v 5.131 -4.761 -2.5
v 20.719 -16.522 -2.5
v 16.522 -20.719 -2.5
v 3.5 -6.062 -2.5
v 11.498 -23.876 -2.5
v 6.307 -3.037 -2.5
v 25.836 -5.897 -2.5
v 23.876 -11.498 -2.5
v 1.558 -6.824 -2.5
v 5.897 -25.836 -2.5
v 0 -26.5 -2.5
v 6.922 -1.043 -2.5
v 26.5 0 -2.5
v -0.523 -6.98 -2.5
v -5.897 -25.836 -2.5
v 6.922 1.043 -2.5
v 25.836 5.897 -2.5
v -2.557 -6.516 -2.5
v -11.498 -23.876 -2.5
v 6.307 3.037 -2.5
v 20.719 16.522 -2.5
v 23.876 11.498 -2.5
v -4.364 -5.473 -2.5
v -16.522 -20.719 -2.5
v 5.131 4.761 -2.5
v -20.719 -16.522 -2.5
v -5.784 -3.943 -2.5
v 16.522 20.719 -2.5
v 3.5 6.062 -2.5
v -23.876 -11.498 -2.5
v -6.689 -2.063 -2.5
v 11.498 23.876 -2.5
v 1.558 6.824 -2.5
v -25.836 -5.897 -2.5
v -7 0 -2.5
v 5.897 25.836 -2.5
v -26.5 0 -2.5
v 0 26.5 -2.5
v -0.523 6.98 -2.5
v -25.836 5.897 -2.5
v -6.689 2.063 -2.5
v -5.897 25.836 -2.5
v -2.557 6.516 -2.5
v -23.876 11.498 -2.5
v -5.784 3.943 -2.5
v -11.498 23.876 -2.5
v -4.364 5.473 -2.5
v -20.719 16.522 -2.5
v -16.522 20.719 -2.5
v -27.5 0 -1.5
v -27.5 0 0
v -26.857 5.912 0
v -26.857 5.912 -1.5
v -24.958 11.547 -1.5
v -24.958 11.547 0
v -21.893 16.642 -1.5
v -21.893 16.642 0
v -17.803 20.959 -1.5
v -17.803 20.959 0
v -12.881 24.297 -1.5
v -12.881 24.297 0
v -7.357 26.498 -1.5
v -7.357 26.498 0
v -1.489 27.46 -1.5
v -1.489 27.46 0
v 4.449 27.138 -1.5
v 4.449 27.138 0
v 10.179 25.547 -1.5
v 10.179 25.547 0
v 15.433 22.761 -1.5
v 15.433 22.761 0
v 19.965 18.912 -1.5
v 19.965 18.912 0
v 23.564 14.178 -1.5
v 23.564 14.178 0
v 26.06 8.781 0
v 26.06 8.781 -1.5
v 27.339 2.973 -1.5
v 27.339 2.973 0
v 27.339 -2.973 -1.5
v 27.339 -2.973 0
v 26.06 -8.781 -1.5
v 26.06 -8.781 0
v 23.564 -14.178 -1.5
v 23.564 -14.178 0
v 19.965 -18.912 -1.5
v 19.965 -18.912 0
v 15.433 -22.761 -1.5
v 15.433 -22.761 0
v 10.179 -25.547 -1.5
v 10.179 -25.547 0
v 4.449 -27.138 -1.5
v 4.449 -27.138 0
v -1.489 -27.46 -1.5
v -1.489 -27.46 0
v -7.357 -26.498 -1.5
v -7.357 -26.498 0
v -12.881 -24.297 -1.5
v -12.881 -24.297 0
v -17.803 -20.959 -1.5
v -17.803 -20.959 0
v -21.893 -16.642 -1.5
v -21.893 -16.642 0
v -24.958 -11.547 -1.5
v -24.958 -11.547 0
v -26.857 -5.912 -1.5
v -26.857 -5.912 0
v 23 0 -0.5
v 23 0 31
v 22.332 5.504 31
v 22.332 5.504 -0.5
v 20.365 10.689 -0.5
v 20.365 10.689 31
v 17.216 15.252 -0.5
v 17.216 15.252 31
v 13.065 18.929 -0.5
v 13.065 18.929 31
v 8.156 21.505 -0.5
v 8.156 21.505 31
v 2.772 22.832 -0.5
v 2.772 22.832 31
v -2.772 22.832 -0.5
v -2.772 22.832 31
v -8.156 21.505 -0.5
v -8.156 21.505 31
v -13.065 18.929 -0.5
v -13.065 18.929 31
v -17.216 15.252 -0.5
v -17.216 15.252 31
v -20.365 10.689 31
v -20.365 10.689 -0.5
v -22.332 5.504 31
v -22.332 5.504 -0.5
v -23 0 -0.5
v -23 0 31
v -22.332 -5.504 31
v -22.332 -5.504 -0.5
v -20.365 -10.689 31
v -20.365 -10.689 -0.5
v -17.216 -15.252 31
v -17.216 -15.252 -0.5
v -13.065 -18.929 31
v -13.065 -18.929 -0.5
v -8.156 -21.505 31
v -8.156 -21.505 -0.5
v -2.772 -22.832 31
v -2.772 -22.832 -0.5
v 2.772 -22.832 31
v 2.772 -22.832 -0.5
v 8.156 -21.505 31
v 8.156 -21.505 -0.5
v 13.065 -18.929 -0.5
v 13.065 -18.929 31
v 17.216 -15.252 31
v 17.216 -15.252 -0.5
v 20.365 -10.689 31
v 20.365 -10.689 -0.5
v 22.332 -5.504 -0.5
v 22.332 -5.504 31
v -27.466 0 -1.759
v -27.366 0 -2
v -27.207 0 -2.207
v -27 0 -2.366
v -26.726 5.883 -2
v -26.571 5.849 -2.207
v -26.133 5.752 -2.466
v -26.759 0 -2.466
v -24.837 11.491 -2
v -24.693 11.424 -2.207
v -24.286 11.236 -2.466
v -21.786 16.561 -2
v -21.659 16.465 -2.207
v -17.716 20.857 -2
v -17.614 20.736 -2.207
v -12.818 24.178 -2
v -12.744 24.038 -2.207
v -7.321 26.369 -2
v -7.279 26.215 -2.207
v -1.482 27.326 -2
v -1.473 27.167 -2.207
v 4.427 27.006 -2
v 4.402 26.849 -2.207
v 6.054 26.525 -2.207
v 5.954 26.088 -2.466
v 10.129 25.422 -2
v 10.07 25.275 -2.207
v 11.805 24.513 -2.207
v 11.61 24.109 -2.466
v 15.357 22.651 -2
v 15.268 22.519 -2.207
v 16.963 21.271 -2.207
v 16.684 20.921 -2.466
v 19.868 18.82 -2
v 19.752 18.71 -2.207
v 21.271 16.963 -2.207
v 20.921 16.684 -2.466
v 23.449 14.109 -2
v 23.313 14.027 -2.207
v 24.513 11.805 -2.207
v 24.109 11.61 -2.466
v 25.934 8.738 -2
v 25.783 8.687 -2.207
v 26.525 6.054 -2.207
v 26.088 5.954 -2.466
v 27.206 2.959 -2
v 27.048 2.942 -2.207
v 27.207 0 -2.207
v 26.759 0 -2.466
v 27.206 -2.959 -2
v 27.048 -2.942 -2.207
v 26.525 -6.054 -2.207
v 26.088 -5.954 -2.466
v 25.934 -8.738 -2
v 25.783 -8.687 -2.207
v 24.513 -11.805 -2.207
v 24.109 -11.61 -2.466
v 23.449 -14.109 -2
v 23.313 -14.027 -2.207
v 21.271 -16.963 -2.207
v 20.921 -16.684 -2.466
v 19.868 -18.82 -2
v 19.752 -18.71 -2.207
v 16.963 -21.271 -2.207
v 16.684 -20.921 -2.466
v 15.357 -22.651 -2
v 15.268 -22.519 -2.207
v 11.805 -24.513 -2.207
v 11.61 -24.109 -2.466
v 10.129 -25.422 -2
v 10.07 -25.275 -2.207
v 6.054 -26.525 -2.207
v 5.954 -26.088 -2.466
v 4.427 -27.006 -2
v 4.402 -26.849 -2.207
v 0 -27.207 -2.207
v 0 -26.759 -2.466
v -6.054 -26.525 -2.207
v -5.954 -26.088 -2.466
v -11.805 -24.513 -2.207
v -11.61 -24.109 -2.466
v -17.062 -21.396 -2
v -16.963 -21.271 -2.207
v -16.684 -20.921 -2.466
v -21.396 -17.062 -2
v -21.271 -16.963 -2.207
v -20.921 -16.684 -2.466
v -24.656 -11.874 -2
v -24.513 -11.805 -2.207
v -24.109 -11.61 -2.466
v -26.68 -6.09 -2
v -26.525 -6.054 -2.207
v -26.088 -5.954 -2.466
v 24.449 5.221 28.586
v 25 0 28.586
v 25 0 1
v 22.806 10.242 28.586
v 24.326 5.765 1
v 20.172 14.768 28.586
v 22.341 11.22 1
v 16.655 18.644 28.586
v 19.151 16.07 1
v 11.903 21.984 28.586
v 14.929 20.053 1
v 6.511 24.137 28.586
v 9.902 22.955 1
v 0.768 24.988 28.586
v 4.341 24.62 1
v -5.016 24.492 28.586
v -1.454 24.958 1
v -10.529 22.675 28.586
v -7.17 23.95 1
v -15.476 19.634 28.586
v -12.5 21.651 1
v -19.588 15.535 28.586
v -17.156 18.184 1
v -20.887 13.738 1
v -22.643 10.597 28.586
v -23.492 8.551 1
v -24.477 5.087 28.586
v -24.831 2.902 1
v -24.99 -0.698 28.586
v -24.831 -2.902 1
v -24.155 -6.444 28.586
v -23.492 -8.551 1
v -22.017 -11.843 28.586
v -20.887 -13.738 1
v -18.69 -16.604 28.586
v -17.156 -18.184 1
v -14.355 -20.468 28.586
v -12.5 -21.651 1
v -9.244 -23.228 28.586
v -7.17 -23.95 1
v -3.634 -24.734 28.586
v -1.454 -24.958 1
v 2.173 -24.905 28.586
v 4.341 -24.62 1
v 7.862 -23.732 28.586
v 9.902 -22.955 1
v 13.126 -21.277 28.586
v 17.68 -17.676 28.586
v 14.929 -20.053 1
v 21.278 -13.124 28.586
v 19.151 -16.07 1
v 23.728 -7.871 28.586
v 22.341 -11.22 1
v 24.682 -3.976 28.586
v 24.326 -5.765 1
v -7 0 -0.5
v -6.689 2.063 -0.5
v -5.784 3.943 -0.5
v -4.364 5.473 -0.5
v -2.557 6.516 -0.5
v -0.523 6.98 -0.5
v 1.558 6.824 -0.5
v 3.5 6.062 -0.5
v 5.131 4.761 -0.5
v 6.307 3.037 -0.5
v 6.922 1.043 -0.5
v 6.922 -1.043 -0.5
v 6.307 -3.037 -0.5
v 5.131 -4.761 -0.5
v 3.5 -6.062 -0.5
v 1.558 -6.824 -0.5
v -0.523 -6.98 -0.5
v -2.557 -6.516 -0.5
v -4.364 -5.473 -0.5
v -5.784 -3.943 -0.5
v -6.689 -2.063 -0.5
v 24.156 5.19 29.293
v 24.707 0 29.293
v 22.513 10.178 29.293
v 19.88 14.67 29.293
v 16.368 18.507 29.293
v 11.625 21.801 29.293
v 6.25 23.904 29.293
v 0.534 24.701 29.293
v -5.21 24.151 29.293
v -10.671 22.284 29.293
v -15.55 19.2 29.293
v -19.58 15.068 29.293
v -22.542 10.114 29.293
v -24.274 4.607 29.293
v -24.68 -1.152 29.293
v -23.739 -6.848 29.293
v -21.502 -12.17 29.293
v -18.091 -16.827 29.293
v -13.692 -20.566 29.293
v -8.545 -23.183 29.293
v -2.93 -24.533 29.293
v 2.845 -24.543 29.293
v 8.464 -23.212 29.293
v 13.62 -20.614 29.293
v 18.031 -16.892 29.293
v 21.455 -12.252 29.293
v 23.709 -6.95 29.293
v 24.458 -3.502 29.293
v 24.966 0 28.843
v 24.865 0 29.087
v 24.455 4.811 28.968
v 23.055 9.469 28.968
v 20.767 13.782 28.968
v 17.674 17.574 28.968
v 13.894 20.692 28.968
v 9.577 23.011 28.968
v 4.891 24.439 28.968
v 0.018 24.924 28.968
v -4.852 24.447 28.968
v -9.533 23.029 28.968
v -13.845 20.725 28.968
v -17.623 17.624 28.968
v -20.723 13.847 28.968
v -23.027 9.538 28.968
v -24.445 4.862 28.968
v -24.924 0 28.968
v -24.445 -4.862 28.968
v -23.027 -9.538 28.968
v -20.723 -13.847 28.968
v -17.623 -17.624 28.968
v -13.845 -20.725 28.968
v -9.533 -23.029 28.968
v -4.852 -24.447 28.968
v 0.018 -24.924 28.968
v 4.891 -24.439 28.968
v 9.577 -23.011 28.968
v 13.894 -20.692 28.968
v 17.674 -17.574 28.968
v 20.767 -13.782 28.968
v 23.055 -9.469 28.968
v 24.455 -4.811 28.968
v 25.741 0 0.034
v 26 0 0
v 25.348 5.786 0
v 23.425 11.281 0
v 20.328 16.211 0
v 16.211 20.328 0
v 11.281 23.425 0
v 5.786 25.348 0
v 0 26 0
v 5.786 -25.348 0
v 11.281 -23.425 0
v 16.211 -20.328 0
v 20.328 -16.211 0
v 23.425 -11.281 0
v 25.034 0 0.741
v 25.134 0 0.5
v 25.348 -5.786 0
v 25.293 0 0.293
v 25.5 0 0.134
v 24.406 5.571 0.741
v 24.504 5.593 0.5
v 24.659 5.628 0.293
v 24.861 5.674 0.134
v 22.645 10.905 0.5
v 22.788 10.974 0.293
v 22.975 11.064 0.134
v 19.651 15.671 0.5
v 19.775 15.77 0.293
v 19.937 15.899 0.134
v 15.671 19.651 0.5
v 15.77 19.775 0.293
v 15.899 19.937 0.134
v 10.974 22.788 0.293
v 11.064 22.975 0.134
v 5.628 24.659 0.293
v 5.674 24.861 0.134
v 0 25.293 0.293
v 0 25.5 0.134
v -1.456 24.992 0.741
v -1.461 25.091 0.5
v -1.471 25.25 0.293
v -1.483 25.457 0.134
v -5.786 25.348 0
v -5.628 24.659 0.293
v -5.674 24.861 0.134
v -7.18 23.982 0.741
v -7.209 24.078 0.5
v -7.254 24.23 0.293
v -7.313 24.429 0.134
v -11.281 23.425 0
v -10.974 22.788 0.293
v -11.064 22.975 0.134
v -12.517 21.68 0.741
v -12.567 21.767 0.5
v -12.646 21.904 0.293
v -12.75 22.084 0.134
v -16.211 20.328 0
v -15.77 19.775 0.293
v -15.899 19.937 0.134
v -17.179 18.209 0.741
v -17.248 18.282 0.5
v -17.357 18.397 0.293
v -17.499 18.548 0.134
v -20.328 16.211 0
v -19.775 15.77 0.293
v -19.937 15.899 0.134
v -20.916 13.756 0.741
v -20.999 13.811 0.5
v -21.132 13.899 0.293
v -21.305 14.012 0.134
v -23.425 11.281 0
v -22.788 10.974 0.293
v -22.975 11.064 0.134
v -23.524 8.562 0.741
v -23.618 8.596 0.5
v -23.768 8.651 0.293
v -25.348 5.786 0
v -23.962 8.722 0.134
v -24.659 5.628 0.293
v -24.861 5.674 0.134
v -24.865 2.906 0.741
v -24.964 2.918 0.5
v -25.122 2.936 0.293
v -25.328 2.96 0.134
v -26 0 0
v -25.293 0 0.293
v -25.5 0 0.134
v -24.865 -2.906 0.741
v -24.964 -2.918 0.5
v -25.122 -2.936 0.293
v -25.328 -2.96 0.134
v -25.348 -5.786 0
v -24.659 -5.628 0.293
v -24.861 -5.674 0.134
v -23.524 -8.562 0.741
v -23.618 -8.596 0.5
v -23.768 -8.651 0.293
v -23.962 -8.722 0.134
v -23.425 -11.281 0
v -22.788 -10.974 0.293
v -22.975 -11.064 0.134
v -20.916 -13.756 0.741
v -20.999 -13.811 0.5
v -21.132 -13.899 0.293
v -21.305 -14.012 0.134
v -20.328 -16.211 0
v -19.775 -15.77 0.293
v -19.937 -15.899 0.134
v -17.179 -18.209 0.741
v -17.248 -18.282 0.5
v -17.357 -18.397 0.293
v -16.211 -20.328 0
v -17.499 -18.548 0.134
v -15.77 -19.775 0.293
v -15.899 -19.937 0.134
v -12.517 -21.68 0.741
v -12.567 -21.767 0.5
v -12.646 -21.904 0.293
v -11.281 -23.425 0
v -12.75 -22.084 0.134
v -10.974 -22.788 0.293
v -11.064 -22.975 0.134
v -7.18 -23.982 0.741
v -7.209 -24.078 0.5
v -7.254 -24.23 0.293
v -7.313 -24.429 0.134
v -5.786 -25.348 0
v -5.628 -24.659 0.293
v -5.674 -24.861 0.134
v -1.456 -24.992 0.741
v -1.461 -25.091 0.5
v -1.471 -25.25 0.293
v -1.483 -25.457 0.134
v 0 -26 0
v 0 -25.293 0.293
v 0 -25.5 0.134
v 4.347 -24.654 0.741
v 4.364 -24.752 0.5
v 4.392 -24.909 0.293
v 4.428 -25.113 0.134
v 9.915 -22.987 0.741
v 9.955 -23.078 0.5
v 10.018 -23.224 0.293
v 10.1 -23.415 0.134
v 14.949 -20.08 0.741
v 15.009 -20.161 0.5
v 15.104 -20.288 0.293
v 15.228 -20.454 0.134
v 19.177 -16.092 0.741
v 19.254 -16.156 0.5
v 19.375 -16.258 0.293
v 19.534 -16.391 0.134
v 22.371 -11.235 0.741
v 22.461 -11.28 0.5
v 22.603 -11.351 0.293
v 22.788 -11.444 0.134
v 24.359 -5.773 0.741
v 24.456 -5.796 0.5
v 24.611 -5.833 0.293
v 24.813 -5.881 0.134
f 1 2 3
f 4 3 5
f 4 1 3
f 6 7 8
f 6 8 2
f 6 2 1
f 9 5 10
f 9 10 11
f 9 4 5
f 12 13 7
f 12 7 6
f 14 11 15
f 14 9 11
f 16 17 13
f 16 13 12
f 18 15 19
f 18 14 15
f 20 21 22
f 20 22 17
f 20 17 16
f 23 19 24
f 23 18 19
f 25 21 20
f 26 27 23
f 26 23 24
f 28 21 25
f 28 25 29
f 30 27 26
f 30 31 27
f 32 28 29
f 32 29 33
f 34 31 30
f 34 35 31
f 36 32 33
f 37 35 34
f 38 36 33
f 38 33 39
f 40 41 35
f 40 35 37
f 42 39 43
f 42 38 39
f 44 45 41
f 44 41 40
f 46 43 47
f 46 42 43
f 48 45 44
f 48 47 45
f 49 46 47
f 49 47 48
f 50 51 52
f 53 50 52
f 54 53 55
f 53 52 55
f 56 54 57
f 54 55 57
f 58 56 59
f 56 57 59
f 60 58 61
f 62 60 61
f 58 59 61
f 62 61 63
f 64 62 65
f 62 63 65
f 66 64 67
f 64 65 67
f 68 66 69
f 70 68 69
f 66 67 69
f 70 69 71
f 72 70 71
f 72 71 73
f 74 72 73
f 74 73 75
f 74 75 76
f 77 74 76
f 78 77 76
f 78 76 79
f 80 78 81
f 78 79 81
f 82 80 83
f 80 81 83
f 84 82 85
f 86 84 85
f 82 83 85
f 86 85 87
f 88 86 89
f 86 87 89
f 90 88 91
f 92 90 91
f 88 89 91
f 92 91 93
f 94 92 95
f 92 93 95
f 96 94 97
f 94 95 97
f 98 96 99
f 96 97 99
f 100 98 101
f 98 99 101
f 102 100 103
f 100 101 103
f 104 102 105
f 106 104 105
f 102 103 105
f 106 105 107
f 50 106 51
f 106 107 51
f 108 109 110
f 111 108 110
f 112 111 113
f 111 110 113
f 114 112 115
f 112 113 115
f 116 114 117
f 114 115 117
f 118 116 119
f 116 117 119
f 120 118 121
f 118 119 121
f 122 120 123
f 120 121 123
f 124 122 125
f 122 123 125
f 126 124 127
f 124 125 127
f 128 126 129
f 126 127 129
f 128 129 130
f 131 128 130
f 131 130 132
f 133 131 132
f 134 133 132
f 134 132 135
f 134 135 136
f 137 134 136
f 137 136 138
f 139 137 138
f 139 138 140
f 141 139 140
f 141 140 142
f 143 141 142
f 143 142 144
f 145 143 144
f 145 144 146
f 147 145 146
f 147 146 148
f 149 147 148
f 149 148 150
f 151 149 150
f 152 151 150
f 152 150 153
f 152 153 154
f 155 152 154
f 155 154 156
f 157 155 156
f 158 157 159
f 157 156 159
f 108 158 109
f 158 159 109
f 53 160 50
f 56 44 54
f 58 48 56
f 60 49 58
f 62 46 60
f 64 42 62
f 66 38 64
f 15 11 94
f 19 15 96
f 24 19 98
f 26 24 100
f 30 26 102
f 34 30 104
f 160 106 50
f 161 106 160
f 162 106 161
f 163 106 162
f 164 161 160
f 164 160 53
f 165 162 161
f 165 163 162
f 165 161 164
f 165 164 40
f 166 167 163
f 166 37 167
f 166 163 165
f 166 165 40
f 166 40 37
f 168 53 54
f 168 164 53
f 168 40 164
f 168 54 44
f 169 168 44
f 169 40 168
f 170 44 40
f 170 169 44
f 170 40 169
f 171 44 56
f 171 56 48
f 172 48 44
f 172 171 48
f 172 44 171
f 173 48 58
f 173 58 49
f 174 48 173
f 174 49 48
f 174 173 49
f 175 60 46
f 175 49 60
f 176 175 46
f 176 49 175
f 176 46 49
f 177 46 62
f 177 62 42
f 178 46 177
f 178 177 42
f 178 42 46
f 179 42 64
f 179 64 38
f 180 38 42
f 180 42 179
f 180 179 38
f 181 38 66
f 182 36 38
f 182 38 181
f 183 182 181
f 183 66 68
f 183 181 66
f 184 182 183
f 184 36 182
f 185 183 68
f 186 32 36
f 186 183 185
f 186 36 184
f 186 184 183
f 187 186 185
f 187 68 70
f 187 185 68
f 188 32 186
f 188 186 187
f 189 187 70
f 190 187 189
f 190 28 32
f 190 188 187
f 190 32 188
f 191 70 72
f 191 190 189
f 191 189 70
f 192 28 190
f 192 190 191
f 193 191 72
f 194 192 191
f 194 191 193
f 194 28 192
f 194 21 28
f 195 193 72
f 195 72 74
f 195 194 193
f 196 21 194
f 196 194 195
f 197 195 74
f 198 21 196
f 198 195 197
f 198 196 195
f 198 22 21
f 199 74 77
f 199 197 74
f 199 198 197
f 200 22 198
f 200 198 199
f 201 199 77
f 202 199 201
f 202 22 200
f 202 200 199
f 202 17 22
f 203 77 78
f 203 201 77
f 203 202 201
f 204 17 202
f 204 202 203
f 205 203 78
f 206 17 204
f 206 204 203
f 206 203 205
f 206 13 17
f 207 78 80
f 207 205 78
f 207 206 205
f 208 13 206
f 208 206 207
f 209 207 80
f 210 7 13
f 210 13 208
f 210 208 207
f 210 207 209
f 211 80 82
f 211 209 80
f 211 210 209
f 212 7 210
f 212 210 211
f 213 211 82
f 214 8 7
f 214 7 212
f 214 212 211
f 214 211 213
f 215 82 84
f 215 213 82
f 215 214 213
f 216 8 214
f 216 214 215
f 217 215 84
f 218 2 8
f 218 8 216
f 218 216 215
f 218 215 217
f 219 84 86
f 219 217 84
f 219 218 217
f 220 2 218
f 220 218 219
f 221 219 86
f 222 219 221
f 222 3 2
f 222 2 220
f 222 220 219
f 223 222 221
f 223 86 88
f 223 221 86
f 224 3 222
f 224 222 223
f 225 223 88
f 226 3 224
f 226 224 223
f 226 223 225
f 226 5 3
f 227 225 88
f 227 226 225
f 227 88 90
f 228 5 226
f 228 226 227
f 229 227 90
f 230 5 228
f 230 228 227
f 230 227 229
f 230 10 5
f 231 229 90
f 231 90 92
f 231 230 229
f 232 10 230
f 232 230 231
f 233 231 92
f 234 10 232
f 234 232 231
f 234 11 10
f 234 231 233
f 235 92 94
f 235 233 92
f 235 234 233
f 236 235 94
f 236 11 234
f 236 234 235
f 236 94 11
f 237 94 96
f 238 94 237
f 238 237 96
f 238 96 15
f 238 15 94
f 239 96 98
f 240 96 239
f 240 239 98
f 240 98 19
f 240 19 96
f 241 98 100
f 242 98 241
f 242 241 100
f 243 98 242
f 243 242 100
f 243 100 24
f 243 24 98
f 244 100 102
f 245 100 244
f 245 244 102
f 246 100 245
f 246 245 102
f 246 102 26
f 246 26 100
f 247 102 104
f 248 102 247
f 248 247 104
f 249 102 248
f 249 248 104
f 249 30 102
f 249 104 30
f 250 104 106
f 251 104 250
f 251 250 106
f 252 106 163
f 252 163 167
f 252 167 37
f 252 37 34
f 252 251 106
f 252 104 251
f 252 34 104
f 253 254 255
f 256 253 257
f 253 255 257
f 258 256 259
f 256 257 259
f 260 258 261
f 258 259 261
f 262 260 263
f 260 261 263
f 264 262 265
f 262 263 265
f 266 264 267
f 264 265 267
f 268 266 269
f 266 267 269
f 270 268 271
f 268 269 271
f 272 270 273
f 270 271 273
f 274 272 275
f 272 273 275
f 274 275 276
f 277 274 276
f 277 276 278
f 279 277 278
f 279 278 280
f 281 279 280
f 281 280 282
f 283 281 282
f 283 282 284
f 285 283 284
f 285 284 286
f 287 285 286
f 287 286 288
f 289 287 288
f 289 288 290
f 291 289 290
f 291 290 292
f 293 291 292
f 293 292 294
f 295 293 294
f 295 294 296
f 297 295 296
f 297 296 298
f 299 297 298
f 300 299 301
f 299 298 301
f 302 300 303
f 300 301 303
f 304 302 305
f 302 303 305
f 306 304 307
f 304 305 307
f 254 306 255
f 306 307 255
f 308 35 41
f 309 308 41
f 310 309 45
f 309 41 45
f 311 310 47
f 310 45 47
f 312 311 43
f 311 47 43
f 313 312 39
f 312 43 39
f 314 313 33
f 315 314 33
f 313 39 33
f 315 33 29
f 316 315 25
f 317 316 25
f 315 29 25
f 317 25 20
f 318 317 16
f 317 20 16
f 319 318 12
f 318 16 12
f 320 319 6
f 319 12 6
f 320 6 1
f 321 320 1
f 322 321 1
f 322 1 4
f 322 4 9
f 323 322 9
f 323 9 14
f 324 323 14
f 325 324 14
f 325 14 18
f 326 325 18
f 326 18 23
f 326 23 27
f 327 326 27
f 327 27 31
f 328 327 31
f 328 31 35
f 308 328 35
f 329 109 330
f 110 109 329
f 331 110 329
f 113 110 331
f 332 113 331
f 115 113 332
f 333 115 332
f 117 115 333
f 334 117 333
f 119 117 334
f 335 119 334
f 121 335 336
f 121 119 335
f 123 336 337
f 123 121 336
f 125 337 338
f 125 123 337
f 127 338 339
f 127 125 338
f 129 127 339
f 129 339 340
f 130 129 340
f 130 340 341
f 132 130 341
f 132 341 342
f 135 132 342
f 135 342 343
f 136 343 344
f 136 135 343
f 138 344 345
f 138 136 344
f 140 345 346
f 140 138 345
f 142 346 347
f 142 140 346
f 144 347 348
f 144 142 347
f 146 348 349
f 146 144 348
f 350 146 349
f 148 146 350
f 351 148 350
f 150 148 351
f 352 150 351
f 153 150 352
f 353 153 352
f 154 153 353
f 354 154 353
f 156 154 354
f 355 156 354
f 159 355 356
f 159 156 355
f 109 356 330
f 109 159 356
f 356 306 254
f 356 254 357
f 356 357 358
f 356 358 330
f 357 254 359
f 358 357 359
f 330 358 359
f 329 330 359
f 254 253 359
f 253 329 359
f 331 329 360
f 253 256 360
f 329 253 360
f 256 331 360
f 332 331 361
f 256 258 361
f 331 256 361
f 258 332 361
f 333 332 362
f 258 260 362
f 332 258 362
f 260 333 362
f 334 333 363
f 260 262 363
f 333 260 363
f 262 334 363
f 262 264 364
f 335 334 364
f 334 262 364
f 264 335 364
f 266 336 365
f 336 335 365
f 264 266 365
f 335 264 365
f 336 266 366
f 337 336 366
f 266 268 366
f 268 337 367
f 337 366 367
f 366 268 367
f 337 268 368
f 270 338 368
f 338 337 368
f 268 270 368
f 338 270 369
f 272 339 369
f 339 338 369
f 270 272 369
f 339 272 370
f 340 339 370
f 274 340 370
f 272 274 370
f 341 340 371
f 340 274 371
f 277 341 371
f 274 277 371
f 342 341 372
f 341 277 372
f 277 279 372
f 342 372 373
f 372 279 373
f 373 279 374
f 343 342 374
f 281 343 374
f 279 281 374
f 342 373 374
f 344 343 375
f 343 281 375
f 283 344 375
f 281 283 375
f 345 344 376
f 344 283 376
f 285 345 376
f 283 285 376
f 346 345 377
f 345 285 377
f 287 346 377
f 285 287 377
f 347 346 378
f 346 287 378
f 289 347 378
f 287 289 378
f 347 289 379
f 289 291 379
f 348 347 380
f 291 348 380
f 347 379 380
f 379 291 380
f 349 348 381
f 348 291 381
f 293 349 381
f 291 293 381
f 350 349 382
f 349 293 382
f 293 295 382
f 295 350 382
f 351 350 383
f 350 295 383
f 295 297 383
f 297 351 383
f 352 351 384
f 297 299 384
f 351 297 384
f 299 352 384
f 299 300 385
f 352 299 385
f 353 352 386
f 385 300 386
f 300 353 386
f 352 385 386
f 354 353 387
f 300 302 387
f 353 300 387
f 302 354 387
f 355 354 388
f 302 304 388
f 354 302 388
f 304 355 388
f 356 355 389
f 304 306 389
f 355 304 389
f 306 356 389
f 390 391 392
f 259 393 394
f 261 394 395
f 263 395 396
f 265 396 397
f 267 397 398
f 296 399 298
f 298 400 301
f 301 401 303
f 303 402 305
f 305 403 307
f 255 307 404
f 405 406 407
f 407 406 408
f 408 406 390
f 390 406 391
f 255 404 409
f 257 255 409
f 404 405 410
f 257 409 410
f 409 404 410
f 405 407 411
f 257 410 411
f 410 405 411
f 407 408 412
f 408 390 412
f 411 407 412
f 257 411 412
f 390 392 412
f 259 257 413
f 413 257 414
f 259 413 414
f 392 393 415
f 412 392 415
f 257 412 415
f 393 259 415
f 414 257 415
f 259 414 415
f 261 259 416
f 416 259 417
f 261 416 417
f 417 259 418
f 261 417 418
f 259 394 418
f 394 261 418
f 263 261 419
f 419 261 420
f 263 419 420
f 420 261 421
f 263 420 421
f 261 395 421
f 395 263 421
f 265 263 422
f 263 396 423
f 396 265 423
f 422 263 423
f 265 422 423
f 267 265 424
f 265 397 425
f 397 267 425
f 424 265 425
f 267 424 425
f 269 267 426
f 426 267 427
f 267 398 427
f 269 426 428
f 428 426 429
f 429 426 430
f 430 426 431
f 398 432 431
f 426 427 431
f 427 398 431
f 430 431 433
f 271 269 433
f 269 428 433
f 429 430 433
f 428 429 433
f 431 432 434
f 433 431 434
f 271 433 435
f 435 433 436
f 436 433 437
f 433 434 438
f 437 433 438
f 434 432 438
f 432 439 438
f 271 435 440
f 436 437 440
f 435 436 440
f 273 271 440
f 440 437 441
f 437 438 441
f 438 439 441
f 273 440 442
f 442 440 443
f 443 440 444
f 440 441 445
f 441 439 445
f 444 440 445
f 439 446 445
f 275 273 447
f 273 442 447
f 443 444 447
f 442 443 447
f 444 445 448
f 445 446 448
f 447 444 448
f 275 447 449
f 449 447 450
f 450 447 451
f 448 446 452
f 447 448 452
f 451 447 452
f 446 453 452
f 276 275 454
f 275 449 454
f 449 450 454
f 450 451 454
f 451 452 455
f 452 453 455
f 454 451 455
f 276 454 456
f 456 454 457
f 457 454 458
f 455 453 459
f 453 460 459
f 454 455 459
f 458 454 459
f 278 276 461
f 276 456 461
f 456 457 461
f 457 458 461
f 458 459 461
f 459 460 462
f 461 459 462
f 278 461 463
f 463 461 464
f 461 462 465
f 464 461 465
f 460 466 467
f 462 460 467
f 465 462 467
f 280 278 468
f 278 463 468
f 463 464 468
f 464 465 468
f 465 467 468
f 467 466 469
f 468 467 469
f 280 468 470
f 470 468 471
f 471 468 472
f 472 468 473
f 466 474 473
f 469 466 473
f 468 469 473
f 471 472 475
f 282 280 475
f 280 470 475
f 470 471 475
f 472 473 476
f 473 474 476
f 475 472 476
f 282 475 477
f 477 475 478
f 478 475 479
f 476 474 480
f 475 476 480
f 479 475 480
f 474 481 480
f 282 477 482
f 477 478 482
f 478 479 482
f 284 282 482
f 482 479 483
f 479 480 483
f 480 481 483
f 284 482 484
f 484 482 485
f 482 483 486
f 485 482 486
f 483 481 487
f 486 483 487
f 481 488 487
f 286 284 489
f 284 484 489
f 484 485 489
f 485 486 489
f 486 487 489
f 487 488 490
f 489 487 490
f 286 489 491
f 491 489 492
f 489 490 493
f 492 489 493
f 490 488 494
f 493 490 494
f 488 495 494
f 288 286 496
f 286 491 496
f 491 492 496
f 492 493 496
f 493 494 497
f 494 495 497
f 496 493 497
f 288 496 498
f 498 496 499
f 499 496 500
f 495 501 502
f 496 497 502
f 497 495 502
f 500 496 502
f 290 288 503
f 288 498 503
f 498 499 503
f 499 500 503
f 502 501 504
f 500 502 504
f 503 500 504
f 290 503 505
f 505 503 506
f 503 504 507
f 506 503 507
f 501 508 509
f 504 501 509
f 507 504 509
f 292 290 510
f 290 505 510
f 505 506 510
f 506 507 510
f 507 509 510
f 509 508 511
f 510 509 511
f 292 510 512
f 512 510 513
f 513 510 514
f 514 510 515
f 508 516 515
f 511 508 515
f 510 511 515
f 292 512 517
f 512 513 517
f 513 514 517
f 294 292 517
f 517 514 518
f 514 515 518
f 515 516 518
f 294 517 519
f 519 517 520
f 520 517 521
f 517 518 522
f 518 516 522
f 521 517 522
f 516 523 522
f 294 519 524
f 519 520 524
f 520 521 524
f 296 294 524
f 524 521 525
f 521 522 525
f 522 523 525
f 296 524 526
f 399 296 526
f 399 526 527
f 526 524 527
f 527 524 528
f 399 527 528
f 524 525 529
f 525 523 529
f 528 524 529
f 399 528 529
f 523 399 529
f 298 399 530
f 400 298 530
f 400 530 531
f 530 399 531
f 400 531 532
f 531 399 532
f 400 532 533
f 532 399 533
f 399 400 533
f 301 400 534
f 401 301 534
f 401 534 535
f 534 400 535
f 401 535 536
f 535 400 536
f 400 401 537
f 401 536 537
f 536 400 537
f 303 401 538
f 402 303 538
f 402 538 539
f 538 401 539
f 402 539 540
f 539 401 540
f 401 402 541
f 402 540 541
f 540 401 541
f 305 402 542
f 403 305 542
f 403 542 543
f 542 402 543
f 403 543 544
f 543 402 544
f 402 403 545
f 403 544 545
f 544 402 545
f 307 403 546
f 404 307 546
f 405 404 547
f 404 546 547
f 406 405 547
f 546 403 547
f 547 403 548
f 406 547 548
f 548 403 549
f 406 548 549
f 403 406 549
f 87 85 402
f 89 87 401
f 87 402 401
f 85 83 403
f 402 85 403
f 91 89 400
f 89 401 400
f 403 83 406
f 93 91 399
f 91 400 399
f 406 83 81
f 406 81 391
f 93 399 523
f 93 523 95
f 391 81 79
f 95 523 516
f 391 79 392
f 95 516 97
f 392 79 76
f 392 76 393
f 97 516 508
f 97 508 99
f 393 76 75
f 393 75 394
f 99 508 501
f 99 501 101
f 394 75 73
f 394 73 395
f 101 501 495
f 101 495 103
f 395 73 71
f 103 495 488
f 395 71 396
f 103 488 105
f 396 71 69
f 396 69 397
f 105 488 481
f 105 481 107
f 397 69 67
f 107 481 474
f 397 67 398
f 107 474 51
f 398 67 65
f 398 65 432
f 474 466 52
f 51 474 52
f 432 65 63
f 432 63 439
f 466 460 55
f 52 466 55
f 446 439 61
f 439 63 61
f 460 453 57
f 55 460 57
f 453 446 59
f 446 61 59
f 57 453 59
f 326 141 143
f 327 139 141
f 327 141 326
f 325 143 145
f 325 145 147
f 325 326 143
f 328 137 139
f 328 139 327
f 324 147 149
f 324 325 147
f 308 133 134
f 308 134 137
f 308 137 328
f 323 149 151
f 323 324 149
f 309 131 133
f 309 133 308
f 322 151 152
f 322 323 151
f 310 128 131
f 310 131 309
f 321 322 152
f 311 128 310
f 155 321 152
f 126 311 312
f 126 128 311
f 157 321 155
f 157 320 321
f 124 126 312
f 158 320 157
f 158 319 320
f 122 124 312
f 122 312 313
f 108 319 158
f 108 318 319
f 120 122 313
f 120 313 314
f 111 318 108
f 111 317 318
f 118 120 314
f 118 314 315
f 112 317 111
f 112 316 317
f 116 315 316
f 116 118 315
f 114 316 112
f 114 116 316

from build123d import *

# Parameters (mm, degrees)
SKETCH_1_R          = 25
EXTRUDE_1_DEPTH     = 32
SKETCH_2_R          = 27.5
EXTRUDE_2_DEPTH     = 2.5
SKETCH_3_R          = 23
CUT_EXTRUDE_1_DEPTH = 32.5
CHAMFER_1_SIZE      = 3
FILLET_1_R          = 1
FILLET_2_R          = 1
FILLET_3_R          = 1
SKETCH_4_R          = 1.6
CUT_EXTRUDE_2_DEPTH = 32.5
SKETCH_5_R          = 7
CUT_EXTRUDE_3_DEPTH = 10


with BuildPart() as part:
    # Эскиз1 → Бобышка-Вытянуть1 (new body)
    with BuildSketch(Plane.XY):
        Circle(SKETCH_1_R)
    extrude(amount=EXTRUDE_1_DEPTH)

    # Эскиз2 → Бобышка-Вытянуть2 (add)
    with BuildSketch(Plane(origin=(0, 0, 0), x_dir=(-1, 0, 0), z_dir=(0, 0, -1))):
        Circle(SKETCH_2_R)
    extrude(amount=EXTRUDE_2_DEPTH)

    # Эскиз3 → Вырез-Вытянуть1 (cut)
    with BuildSketch(Plane.XY.offset(32)):
        Circle(SKETCH_3_R)
    extrude(amount=-CUT_EXTRUDE_1_DEPTH, mode=Mode.SUBTRACT)

    # Фаска1
    # the kernel refuses this chamfer: 3 mm, written as the material it takes off along each edge
    with BuildSketch(Plane(origin=(0, 0, 32), x_dir=(1, 0, 0), z_dir=(0, -1, 0))) as chamfer_1_piece_1:
        Polygon((25, -CHAMFER_1_SIZE), (25 - CHAMFER_1_SIZE, 0), (25, 0), align=None)
    revolve(axis=Axis((0, 0, 32), (0, 0, 1)), mode=Mode.SUBTRACT)

    # Скругление1
    fillet_1_edges = [part.edges().sort_by_distance(p)[0] for p in [
        (-25, 0, 29),
    ]]
    fillet(fillet_1_edges, radius=FILLET_1_R)

    # Скругление2
    fillet_2_edges = [part.edges().sort_by_distance(p)[0] for p in [
        (-25, 0, 0),
    ]]
    fillet(fillet_2_edges, radius=FILLET_2_R)

    # Скругление3
    fillet_3_edges = [part.edges().sort_by_distance(p)[0] for p in [
        (27.5, 0, -2.5),
    ]]
    fillet(fillet_3_edges, radius=FILLET_3_R)

    # Эскиз4 → Вырез-Вытянуть2 (cut)
    with BuildSketch(Plane(origin=(0, 0, -2.5), x_dir=(-1, 0, 0), z_dir=(0, 0, -1))):
        Circle(SKETCH_4_R)
    extrude(amount=-CUT_EXTRUDE_2_DEPTH, mode=Mode.SUBTRACT)

    # Эскиз5 → Вырез-Вытянуть3 (cut)
    with BuildSketch(Plane(origin=(0, 0, -2.5), x_dir=(-1, 0, 0), z_dir=(0, 0, -1))):
        Circle(SKETCH_5_R)
    extrude(amount=-CUT_EXTRUDE_3_DEPTH, mode=Mode.SUBTRACT)


solid = part.part
